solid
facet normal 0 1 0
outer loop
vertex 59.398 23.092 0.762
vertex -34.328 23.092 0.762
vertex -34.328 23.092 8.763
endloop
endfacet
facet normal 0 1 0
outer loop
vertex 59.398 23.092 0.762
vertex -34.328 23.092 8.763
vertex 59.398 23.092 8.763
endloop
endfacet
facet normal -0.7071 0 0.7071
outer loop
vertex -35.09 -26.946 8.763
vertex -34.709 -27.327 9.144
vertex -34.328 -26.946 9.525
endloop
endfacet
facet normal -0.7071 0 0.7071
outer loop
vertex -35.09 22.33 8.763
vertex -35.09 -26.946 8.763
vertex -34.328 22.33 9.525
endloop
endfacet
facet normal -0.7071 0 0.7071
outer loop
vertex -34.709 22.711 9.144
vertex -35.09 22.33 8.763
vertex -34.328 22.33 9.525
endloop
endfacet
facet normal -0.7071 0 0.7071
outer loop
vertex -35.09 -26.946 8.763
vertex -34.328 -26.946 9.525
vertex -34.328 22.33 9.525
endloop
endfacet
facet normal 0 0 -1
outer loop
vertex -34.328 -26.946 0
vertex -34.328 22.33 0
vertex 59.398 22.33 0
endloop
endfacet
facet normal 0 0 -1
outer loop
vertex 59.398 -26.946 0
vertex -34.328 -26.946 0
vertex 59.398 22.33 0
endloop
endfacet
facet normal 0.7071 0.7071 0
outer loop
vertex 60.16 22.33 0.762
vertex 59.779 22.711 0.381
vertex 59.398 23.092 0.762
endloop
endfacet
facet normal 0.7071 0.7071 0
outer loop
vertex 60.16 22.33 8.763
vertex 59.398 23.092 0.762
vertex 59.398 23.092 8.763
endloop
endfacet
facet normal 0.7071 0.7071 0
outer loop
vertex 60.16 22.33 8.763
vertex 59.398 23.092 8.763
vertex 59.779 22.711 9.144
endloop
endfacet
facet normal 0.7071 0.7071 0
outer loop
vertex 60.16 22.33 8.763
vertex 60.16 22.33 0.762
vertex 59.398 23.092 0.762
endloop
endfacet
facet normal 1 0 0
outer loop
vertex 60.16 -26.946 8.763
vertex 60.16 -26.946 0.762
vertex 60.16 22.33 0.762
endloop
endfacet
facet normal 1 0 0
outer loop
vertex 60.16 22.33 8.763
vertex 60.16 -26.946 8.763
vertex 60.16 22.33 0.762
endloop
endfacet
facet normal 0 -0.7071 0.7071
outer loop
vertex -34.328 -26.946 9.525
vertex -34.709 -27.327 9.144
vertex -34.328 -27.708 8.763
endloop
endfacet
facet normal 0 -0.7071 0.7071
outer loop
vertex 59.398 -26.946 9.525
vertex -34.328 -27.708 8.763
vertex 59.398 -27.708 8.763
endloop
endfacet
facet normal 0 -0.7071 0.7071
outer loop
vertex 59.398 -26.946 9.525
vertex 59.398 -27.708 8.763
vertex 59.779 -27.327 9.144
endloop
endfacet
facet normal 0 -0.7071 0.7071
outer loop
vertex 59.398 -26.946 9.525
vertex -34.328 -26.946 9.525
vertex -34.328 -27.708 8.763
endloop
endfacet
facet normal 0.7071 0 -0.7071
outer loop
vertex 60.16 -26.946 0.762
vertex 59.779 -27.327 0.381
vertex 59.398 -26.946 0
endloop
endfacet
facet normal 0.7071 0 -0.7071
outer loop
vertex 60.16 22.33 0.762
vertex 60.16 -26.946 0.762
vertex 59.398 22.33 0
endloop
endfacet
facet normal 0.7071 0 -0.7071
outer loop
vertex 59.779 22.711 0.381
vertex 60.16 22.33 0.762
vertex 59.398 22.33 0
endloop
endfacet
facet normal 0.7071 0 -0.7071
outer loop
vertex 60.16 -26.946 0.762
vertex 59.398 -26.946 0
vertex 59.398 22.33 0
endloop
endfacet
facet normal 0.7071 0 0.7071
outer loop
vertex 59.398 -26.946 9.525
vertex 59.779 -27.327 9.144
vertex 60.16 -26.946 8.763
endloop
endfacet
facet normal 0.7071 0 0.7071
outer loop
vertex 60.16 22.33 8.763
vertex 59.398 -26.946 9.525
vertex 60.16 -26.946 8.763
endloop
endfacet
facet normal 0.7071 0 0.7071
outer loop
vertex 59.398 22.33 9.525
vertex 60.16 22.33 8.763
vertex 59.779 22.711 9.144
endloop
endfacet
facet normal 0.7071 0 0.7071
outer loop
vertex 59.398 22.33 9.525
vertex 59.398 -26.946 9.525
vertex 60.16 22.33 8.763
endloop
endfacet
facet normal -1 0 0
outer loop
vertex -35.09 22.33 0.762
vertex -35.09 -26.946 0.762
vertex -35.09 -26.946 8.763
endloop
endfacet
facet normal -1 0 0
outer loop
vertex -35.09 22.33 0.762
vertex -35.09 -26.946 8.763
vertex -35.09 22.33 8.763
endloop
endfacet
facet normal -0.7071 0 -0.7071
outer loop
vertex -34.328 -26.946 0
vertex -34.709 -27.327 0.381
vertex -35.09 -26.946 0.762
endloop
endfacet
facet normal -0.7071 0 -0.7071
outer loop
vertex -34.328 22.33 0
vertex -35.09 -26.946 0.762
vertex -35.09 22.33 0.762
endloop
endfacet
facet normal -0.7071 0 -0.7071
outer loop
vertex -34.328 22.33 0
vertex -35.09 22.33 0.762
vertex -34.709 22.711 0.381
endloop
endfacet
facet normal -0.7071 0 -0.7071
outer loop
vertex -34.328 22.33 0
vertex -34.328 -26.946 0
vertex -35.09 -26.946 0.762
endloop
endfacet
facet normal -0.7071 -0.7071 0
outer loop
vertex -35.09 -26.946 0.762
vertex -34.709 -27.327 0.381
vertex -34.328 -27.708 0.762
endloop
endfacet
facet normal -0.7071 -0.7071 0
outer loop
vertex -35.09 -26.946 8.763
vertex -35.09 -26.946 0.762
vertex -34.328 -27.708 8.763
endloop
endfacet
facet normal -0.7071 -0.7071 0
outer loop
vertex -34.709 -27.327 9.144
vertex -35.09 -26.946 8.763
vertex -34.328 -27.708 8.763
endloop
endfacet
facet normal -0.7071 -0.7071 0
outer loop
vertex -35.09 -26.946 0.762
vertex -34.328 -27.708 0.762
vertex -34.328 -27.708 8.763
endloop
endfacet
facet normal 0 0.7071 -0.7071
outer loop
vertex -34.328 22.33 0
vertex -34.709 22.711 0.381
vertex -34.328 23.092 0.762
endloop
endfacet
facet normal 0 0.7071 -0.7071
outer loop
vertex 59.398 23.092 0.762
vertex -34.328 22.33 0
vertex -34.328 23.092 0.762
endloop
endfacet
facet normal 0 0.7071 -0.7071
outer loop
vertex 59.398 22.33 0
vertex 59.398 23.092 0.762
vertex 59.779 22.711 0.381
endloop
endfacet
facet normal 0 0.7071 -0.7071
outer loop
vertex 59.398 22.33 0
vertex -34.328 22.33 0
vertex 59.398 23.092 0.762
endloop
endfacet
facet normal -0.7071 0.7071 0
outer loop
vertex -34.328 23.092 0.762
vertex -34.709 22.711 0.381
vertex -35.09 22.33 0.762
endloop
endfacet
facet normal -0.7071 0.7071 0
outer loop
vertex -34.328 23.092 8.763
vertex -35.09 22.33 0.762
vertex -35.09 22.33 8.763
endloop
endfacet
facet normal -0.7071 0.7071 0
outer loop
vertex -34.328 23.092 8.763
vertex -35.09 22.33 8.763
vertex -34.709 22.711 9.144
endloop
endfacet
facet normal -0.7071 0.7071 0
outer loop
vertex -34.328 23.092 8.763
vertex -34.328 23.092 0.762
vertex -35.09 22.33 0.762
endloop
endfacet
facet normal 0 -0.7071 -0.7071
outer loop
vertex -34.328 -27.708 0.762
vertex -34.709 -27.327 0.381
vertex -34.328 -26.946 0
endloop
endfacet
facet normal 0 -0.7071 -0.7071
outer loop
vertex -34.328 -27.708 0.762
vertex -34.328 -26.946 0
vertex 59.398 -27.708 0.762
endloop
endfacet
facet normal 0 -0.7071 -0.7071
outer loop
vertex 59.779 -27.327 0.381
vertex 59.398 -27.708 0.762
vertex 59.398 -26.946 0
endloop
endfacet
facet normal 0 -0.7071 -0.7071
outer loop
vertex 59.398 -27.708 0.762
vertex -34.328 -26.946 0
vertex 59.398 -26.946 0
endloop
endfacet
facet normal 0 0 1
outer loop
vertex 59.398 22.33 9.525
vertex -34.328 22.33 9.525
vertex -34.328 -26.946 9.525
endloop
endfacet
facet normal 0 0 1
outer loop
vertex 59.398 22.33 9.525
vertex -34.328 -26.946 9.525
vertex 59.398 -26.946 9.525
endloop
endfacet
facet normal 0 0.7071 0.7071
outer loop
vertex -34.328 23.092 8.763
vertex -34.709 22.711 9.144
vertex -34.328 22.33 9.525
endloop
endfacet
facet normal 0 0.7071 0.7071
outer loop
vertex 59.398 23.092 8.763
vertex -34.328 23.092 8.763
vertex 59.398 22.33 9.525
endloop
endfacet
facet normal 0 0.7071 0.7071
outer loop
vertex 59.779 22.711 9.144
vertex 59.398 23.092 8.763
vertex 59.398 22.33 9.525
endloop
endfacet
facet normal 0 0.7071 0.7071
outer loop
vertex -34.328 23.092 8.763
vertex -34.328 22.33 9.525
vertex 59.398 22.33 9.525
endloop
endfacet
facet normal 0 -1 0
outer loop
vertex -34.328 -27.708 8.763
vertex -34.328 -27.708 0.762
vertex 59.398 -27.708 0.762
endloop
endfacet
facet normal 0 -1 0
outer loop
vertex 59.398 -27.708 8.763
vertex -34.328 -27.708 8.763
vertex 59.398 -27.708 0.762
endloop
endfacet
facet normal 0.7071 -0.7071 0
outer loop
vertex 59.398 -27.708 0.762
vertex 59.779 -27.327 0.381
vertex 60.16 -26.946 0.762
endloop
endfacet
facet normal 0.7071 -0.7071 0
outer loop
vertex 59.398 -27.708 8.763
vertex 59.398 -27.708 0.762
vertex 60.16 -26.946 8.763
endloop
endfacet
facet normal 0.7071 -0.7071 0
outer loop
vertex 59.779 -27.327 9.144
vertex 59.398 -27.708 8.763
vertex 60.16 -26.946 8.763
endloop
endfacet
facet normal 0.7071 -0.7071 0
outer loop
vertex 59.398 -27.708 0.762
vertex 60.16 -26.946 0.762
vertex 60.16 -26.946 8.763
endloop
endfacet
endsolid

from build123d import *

# Parameters (mm, degrees)
F0_W     = 95.25
F0_H     = 50.8
F1_DEPTH = 9.525
F2_SIZE  = 0.762
F3_SIZE  = 0.762


with BuildPart() as f1:
    # F0 (on Top) → F1 (new body)
    with BuildSketch(Plane.XY):
        with Locations((12.534547, -2.307642)):
            Rectangle(F0_W, F0_H)
    extrude(amount=F1_DEPTH)

    # F2
    f2_edges = [f1.edges().sort_by_distance(p)[0] for p in [
        (-35.090453, -2.307642, 9.525),
        (12.534547, -27.707642, 9.525),
        (60.159547, -2.307642, 9.525),
        (12.534547, 23.092358, 9.525),
        (-35.090453, -2.307642, 0),
        (12.534547, -27.707642, 0),
        (60.159547, -2.307642, 0),
        (12.534547, 23.092358, 0),
    ]]
    chamfer(f2_edges, length=F2_SIZE)

    # F3
    f3_edges = [f1.edges().sort_by_distance(p)[0] for p in [
        (60.159547, -27.707642, 4.7625),
        (-35.090453, -27.707642, 4.7625),
        (60.159547, 23.092358, 4.7625),
        (-35.090453, 23.092358, 4.7625),
    ]]
    chamfer(f3_edges, length=F3_SIZE)


solid = f1.part
